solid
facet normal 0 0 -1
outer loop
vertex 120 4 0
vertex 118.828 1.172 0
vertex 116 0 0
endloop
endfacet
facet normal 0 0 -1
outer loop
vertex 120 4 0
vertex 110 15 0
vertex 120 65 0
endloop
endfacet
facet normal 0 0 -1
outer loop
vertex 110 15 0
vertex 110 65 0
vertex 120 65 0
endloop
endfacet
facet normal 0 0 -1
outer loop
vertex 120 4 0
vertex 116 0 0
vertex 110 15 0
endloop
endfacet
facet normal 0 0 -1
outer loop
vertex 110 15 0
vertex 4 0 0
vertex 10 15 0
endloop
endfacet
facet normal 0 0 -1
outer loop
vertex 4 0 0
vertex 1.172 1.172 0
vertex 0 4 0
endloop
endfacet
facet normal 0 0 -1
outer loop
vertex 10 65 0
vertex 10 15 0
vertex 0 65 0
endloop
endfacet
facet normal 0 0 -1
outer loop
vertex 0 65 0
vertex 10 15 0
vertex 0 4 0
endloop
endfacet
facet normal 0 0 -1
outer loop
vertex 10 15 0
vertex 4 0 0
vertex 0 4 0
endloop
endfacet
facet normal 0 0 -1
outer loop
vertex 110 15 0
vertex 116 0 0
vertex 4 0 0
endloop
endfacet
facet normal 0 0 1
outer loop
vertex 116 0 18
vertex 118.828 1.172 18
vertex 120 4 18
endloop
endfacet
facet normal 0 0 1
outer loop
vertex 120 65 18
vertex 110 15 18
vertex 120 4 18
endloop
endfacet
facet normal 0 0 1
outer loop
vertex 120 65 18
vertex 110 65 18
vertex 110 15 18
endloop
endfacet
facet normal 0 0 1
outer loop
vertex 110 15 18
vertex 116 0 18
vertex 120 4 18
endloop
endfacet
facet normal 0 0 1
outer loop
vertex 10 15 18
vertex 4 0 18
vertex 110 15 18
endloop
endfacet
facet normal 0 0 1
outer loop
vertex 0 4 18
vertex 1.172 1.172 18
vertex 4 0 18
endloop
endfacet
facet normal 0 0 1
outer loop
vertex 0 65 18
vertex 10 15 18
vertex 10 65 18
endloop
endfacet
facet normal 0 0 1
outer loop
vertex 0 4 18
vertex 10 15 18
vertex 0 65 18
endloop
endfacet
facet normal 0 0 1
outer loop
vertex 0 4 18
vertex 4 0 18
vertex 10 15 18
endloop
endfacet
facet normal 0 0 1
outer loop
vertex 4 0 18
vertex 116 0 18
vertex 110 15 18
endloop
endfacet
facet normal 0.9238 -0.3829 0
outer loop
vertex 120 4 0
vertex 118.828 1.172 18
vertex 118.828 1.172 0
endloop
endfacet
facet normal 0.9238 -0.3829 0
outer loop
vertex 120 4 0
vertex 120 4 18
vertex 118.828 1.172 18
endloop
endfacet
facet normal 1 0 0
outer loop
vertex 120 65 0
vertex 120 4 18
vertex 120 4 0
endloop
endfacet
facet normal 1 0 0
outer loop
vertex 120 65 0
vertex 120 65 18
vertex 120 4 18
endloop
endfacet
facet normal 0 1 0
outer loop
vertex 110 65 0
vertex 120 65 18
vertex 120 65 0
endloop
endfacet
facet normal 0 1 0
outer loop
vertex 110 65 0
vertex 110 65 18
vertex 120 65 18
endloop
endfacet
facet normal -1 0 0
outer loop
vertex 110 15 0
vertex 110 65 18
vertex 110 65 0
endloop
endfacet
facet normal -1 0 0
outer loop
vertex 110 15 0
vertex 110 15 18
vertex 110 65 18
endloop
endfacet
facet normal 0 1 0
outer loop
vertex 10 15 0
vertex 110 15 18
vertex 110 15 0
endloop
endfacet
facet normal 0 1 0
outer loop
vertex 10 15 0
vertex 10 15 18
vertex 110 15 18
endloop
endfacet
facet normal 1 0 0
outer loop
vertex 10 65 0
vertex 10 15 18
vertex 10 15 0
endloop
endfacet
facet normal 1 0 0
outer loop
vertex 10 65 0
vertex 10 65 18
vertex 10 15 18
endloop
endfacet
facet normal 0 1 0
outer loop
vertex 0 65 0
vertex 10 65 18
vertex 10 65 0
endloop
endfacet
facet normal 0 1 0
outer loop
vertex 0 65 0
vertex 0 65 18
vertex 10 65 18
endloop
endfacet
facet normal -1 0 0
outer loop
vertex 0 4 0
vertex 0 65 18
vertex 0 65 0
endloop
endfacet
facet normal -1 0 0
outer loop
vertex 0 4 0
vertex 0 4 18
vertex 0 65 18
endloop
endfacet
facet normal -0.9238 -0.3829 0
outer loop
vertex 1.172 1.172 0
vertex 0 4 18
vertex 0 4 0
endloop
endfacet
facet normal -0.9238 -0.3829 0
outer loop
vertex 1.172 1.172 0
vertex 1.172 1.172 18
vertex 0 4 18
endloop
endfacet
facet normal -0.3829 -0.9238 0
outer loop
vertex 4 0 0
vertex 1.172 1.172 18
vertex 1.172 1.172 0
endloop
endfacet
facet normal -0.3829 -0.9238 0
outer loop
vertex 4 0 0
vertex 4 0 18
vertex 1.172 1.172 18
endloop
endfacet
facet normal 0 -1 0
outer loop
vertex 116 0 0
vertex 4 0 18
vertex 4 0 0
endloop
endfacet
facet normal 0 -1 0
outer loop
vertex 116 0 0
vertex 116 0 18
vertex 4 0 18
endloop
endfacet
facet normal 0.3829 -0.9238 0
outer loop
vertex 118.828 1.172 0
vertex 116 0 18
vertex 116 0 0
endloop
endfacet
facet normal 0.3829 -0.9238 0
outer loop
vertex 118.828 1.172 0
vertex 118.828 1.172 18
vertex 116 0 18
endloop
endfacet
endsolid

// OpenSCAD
$fn = 32;

// ----------------------------------------------------------------------
// Heat sink frame: 120 x 65 mm frame, 10 mm walls
// ----------------------------------------------------------------------

// --- parameters (mm) ---
profile_height = 18;      // extrusion height
profile_points = 12;      // points of the closed outline

profile = [[0, 4], [1.172, 1.172], [4, 0], [116, 0], [118.828, 1.172], [120, 4], [120, 65], [110, 65], [110, 15], [10, 15], [10, 65], [0, 65]];  // single closed polygon, 12 points, counter clockwise

// --- the one profile operation ---
linear_extrude(height = profile_height) polygon(points = profile);
